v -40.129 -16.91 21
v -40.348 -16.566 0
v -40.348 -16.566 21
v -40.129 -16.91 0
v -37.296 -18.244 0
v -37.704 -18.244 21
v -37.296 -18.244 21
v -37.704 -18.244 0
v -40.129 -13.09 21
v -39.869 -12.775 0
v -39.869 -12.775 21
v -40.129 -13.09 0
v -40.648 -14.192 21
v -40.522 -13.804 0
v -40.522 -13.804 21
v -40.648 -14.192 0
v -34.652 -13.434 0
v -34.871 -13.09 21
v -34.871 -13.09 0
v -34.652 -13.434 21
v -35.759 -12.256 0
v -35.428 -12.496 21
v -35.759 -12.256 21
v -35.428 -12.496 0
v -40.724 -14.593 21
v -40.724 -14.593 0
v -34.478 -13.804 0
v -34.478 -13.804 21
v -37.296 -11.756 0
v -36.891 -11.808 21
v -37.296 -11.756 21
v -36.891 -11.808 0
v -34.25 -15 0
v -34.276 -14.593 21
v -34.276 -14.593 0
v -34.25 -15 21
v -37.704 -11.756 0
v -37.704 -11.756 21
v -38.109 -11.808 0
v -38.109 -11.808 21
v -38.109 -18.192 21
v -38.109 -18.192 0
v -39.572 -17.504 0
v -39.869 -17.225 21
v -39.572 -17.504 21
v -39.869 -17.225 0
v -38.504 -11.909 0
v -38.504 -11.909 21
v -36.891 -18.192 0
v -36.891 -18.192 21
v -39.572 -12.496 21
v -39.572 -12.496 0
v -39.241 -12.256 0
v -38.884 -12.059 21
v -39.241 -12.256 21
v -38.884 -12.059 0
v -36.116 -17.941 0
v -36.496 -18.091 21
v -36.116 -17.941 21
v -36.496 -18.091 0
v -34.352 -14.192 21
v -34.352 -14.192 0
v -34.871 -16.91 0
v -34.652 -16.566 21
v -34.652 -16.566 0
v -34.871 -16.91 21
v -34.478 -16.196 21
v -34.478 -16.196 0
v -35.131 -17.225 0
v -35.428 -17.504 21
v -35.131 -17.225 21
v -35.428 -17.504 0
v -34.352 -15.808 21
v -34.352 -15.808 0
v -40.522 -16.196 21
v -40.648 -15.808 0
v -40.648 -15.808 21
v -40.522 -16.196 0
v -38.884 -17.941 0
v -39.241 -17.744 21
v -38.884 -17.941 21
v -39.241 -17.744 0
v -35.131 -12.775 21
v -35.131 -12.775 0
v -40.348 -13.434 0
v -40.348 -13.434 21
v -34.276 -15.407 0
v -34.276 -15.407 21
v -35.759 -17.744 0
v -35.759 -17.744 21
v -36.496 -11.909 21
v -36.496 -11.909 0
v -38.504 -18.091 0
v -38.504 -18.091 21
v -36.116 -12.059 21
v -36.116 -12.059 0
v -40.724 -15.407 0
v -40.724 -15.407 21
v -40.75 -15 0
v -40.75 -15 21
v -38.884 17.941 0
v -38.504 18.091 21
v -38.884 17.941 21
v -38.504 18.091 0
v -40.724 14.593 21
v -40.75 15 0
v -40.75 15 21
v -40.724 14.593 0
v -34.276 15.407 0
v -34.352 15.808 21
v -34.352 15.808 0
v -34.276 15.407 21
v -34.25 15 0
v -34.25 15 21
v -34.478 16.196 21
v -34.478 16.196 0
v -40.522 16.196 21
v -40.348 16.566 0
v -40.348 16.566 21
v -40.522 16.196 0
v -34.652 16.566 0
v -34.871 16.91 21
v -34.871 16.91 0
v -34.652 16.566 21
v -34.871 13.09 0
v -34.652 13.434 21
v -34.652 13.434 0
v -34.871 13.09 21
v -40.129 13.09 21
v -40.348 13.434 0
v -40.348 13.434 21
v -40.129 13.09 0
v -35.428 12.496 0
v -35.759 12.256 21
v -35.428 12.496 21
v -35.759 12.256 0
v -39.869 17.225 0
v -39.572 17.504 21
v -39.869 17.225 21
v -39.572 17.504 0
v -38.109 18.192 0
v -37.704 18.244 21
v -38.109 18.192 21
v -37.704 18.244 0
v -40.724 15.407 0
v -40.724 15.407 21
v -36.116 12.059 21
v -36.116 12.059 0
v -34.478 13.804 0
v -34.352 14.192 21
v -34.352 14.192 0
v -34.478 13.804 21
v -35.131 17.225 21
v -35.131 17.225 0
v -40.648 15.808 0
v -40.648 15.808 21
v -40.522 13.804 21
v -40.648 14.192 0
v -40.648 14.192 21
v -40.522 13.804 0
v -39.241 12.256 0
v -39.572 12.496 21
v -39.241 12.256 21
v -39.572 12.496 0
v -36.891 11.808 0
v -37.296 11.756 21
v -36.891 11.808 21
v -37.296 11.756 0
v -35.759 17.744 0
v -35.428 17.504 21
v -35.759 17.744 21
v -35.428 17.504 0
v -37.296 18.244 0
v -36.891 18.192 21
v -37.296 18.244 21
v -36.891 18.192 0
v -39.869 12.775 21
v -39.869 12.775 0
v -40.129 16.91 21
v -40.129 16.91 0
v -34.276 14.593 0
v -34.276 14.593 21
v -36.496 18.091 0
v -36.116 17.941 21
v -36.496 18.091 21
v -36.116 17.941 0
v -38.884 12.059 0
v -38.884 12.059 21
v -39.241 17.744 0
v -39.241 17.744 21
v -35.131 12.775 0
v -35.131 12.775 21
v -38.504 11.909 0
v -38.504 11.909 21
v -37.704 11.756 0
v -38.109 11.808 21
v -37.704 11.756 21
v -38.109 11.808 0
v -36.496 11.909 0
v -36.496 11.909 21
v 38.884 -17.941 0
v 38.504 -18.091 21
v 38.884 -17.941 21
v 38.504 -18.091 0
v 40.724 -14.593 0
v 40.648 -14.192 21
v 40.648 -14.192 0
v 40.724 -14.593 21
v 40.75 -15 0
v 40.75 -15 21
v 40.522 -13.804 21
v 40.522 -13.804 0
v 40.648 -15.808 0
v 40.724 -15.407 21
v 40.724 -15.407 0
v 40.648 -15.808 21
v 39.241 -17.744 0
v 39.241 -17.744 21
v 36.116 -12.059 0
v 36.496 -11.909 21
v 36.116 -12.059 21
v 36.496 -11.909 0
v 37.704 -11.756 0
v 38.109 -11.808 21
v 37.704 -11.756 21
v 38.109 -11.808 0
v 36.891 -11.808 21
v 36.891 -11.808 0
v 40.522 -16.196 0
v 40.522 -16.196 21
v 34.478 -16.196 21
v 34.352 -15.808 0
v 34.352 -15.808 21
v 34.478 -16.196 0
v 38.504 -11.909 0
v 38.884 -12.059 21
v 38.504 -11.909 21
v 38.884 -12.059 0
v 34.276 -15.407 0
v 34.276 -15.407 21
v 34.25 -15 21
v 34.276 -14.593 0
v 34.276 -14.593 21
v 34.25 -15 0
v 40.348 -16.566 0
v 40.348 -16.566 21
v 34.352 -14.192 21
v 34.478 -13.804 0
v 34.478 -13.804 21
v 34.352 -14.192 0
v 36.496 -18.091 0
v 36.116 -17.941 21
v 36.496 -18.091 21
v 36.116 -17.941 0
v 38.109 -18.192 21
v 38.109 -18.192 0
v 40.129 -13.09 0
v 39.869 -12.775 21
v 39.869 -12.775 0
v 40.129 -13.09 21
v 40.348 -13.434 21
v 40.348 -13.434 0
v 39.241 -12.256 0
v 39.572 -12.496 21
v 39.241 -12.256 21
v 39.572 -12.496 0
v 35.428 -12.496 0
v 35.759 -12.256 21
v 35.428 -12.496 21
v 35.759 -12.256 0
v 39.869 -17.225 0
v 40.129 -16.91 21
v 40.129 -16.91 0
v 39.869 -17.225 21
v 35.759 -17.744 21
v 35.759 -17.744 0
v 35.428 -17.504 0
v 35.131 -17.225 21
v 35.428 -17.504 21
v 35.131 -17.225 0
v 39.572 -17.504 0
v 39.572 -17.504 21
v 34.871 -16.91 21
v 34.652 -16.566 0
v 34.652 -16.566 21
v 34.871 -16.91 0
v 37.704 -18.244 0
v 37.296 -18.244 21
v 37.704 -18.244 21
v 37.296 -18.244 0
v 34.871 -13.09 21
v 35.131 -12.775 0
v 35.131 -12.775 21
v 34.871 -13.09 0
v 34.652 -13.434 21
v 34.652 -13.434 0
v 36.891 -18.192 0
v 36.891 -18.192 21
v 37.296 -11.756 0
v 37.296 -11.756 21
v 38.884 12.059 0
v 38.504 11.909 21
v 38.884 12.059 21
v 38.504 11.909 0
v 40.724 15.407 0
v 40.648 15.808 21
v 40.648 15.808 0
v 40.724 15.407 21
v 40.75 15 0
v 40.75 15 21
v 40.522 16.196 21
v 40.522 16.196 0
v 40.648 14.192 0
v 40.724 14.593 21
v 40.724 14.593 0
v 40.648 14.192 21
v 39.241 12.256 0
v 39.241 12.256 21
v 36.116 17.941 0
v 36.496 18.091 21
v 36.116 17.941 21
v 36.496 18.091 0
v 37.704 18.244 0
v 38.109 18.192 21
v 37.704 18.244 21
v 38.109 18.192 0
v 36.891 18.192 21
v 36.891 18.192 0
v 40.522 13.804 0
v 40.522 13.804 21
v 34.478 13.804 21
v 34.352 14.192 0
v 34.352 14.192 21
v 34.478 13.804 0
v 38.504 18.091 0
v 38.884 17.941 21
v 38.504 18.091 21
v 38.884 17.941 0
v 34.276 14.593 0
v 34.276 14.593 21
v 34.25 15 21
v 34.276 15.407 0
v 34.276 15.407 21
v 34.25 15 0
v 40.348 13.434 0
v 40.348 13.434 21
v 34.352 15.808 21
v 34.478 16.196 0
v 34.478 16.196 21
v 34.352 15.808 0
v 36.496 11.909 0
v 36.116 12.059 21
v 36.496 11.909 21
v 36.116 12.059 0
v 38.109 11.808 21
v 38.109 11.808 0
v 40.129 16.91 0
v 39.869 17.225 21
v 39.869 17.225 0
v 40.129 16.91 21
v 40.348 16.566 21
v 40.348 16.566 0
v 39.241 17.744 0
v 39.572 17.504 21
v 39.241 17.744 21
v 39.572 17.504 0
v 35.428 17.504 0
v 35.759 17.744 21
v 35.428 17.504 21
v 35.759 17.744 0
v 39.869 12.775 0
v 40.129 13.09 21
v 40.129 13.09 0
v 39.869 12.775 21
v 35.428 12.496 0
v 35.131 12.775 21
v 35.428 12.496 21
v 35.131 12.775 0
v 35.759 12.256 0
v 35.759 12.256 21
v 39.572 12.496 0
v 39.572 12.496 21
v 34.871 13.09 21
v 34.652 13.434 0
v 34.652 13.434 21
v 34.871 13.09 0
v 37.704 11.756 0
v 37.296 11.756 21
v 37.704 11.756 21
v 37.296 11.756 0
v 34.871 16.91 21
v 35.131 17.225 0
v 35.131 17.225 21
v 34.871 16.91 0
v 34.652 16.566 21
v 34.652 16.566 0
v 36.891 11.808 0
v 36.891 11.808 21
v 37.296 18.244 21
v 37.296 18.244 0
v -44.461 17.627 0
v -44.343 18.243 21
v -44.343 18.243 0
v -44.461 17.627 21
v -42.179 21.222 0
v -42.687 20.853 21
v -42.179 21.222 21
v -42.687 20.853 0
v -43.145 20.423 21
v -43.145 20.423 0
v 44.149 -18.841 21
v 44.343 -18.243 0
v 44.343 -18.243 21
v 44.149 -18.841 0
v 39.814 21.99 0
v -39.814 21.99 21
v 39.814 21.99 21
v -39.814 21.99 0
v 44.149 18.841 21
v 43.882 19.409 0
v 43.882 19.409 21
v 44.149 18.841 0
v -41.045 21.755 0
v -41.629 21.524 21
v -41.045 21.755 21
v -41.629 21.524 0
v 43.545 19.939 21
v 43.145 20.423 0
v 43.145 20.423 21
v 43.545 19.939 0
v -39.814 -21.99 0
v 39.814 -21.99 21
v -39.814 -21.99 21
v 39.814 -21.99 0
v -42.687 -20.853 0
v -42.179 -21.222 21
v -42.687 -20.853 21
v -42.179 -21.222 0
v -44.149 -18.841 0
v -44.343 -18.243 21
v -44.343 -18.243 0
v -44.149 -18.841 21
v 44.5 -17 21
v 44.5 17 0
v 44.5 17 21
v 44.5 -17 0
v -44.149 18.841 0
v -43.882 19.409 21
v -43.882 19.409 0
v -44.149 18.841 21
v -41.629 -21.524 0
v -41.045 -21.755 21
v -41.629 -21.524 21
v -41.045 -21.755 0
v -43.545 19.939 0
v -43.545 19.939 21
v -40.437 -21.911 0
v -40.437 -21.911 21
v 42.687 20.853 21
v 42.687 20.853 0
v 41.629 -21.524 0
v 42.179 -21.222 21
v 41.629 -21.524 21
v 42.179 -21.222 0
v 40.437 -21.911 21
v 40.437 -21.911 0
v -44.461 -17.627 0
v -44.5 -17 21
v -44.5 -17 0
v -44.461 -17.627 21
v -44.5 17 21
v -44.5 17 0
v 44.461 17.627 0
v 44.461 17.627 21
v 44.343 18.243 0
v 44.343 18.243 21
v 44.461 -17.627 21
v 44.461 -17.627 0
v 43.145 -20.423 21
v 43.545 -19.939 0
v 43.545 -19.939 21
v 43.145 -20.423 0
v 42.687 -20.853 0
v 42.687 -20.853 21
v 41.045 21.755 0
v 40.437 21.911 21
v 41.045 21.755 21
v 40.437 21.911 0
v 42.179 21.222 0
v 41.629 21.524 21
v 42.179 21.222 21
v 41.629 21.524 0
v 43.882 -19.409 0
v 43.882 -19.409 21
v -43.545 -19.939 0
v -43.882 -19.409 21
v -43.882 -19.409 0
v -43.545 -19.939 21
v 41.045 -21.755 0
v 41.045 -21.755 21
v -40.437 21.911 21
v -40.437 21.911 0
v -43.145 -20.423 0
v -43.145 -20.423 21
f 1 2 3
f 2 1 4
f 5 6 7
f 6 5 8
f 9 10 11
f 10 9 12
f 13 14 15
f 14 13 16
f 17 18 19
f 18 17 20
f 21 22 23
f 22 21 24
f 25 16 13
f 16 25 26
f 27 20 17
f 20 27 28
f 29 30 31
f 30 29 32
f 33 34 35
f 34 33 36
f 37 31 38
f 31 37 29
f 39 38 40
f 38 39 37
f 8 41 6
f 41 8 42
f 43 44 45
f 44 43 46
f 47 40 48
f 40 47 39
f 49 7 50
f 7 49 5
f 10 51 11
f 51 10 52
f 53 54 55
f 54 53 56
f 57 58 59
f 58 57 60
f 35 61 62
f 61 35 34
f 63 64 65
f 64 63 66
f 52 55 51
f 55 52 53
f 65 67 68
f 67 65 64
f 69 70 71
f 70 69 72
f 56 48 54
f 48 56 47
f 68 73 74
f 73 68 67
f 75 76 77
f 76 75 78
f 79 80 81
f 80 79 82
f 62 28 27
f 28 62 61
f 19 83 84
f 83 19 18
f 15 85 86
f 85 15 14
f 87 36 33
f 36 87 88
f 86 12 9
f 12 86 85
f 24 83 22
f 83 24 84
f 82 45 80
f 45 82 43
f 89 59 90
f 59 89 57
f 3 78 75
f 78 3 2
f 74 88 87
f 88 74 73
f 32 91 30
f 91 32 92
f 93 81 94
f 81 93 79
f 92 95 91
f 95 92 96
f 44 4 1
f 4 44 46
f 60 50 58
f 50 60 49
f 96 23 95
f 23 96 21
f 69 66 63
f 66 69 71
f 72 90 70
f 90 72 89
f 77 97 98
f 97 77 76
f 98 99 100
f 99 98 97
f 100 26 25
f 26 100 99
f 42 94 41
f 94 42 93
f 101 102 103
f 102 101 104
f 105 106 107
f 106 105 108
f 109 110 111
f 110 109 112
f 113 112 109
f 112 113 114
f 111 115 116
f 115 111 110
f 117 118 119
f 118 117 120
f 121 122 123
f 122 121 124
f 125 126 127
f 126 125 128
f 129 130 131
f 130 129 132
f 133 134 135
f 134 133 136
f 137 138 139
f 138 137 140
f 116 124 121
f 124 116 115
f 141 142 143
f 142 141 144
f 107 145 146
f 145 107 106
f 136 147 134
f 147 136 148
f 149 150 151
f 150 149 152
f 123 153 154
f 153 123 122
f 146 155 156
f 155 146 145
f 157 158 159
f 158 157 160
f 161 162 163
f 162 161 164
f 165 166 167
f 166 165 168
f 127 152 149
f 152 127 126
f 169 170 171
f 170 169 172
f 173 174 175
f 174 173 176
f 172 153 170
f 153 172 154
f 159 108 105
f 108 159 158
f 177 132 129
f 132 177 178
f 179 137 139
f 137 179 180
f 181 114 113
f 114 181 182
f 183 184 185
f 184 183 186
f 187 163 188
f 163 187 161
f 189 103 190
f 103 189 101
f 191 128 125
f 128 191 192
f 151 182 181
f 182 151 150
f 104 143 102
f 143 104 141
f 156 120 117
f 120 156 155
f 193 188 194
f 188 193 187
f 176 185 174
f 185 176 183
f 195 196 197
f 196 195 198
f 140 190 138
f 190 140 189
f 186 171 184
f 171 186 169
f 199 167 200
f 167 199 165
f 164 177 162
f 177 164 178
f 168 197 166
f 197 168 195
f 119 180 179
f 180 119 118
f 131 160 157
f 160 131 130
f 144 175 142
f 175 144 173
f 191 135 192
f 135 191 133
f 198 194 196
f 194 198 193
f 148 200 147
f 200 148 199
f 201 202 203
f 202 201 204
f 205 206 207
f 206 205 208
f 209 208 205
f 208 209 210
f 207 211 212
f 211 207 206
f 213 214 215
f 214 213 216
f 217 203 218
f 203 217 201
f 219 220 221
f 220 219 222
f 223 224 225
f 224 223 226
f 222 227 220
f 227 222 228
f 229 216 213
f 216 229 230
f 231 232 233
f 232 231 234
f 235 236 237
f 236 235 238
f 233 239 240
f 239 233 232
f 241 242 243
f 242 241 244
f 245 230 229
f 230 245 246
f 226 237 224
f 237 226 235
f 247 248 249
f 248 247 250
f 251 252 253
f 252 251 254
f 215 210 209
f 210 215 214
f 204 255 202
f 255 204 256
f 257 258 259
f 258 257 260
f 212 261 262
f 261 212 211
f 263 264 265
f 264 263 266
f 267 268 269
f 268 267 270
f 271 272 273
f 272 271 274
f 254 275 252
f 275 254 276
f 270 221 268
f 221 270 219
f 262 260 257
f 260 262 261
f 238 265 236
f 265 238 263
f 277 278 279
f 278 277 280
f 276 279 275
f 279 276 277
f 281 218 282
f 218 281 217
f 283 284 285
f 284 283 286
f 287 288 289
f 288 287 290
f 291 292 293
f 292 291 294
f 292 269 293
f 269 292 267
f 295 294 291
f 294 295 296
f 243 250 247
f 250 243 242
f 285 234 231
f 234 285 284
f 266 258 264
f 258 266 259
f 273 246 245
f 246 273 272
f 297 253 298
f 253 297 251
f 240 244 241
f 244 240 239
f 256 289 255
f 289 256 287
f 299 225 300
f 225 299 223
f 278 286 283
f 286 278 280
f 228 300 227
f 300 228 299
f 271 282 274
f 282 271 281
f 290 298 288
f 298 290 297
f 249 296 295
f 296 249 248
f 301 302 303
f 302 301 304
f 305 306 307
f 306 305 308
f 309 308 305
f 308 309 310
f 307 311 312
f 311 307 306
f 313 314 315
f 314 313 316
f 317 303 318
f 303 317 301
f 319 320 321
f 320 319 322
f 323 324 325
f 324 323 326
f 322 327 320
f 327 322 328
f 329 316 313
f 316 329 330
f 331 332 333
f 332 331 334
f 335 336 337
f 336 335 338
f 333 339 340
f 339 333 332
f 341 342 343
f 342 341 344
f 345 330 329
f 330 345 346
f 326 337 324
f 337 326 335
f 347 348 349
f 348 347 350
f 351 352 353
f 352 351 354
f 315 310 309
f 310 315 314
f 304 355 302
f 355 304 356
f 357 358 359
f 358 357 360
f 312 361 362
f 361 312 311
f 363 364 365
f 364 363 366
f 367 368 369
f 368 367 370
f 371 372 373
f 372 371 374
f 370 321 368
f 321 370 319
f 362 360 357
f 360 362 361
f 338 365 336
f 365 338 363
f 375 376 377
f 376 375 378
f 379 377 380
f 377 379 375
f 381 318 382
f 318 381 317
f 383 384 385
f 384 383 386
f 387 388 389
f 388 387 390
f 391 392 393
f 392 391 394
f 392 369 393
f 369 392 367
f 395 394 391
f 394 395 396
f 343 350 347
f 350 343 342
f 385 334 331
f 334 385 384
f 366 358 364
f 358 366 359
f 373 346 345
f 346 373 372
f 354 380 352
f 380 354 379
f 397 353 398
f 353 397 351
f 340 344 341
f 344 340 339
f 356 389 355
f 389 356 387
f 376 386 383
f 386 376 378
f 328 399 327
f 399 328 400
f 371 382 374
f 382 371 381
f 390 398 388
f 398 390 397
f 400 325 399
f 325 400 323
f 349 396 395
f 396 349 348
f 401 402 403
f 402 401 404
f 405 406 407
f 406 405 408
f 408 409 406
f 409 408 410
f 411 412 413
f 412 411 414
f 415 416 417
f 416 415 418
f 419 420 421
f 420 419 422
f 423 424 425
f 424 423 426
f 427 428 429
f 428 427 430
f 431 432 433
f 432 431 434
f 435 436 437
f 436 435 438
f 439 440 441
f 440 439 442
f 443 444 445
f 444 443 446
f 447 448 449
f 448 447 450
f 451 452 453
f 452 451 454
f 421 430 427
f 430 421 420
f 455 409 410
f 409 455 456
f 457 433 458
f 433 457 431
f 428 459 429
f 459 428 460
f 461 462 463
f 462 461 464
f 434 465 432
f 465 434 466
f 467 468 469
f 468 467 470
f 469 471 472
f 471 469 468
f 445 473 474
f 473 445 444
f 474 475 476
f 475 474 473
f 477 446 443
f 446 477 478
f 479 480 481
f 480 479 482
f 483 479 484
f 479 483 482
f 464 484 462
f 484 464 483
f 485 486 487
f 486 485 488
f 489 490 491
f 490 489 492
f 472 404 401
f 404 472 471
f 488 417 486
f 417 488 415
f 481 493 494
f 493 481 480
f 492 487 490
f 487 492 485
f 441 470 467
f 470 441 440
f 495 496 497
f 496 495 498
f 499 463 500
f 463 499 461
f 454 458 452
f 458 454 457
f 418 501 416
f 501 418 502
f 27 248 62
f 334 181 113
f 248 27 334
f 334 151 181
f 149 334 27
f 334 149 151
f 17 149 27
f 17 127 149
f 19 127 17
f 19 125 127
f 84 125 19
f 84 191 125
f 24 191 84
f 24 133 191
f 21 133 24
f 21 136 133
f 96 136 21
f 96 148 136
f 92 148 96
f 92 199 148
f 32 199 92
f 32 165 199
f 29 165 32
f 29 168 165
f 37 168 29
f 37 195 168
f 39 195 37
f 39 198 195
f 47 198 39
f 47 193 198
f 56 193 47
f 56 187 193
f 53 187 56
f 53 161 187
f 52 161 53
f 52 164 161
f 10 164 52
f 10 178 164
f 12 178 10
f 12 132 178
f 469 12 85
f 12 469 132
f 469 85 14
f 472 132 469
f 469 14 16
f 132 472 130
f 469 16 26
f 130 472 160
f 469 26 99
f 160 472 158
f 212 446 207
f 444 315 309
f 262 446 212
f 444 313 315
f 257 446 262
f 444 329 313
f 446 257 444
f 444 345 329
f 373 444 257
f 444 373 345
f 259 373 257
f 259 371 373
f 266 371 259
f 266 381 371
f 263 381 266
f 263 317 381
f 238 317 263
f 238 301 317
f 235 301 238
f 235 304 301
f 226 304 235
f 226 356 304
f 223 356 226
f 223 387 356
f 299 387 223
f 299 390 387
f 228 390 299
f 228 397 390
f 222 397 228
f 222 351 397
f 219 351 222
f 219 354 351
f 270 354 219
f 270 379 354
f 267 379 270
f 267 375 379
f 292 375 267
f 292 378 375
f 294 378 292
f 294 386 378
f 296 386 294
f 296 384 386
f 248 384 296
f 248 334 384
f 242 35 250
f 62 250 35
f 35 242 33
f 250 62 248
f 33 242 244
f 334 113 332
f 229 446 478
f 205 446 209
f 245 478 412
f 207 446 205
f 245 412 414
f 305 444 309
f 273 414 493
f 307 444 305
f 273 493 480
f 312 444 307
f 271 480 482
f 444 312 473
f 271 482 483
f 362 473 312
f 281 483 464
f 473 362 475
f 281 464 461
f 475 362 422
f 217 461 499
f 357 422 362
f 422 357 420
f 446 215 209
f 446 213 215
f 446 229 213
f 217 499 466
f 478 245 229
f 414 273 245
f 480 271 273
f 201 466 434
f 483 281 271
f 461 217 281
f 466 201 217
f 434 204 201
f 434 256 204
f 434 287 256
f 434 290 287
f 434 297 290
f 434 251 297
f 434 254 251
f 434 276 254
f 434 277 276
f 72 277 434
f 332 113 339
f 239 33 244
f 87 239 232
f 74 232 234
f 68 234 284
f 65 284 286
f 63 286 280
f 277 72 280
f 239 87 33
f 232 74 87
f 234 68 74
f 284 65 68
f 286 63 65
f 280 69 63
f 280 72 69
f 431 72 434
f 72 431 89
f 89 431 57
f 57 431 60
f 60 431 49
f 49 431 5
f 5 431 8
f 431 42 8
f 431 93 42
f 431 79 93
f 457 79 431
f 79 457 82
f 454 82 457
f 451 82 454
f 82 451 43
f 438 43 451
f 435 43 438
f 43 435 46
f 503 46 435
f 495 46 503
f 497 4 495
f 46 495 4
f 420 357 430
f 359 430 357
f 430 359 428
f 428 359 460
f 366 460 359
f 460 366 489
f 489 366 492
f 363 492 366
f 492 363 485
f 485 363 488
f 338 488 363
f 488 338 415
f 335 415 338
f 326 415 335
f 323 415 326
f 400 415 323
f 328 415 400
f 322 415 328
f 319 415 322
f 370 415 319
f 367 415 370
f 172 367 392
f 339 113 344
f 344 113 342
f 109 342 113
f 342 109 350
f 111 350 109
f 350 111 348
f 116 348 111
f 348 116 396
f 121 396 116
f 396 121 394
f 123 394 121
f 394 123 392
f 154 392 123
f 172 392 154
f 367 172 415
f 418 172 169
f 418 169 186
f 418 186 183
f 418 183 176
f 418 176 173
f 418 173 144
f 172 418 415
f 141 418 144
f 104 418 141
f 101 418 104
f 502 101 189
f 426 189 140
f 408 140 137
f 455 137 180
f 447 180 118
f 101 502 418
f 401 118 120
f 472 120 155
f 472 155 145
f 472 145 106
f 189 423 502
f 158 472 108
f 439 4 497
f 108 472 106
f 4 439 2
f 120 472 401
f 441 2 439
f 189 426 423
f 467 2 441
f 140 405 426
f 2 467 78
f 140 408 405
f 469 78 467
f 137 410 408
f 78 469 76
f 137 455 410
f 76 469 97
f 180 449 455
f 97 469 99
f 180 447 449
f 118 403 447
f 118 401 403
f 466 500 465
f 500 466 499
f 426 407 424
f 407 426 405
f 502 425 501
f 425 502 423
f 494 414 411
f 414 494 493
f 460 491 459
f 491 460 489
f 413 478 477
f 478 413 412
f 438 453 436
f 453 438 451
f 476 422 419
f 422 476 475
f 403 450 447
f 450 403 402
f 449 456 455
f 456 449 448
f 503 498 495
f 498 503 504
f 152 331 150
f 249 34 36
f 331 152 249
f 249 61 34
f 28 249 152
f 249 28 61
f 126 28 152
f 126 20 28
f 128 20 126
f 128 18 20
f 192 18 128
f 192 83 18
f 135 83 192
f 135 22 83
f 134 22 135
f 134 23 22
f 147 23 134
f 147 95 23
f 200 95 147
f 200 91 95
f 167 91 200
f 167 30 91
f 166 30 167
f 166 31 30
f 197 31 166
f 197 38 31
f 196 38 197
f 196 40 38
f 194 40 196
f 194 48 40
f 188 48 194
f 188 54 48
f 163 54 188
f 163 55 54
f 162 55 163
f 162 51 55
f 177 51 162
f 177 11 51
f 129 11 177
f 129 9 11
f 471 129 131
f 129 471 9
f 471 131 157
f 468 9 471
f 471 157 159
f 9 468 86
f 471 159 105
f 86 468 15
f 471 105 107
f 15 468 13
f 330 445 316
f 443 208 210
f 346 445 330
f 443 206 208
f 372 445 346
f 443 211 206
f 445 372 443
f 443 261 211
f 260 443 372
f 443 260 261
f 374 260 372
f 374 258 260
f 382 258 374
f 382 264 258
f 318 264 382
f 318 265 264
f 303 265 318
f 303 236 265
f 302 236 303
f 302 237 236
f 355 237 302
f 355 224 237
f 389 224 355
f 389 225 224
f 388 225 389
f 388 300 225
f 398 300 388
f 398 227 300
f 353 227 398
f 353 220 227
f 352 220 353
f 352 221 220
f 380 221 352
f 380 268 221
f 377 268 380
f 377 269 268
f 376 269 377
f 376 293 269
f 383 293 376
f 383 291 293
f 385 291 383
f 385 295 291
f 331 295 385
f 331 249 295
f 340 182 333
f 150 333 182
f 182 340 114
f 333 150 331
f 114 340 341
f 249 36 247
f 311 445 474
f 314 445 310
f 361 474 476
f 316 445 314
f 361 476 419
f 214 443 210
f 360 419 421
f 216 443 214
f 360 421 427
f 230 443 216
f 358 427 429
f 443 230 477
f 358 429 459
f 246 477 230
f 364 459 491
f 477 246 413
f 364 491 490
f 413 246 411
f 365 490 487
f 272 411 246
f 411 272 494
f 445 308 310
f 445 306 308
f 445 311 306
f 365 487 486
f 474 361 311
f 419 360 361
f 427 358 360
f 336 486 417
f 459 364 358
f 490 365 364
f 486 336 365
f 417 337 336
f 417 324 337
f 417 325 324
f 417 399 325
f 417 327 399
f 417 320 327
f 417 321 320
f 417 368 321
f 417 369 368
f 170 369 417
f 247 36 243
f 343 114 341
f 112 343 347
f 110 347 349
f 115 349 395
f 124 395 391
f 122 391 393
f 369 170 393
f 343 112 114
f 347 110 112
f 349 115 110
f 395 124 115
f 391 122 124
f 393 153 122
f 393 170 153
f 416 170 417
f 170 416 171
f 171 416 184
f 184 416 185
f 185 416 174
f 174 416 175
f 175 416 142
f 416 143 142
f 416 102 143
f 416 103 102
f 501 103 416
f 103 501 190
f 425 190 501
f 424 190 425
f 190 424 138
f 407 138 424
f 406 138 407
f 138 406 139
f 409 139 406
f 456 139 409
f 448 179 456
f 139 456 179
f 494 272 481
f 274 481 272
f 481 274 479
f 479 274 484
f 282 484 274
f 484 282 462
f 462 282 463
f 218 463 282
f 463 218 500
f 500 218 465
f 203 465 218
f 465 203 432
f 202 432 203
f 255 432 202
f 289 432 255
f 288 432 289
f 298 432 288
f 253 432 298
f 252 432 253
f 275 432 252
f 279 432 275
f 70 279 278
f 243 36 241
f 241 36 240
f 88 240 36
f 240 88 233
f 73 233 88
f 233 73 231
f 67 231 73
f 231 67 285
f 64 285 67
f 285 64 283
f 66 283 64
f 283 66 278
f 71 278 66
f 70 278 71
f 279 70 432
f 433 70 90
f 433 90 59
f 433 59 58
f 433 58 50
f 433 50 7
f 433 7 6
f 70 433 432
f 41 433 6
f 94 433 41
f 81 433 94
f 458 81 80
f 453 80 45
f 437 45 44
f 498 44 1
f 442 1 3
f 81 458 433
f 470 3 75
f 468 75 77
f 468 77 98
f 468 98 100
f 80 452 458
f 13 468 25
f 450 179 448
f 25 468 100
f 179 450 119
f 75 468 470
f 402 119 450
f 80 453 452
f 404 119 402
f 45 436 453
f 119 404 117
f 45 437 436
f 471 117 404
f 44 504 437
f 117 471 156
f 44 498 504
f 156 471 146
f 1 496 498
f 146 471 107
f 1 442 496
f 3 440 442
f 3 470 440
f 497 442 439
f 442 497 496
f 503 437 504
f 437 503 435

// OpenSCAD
$fn = 50;


difference() {
	union() {
		hull() {
			translate(v = [-39.5000000000, 17.0000000000, 0]) {
				cylinder(h = 21, r = 5);
			}
			translate(v = [39.5000000000, 17.0000000000, 0]) {
				cylinder(h = 21, r = 5);
			}
			translate(v = [-39.5000000000, -17.0000000000, 0]) {
				cylinder(h = 21, r = 5);
			}
			translate(v = [39.5000000000, -17.0000000000, 0]) {
				cylinder(h = 21, r = 5);
			}
		}
	}
	union() {
		translate(v = [-37.5000000000, -15.0000000000, -100.0000000000]) {
			cylinder(h = 200, r = 3.2500000000);
		}
		translate(v = [-37.5000000000, 15.0000000000, -100.0000000000]) {
			cylinder(h = 200, r = 3.2500000000);
		}
		translate(v = [37.5000000000, -15.0000000000, -100.0000000000]) {
			cylinder(h = 200, r = 3.2500000000);
		}
		translate(v = [37.5000000000, 15.0000000000, -100.0000000000]) {
			cylinder(h = 200, r = 3.2500000000);
		}
	}
}
